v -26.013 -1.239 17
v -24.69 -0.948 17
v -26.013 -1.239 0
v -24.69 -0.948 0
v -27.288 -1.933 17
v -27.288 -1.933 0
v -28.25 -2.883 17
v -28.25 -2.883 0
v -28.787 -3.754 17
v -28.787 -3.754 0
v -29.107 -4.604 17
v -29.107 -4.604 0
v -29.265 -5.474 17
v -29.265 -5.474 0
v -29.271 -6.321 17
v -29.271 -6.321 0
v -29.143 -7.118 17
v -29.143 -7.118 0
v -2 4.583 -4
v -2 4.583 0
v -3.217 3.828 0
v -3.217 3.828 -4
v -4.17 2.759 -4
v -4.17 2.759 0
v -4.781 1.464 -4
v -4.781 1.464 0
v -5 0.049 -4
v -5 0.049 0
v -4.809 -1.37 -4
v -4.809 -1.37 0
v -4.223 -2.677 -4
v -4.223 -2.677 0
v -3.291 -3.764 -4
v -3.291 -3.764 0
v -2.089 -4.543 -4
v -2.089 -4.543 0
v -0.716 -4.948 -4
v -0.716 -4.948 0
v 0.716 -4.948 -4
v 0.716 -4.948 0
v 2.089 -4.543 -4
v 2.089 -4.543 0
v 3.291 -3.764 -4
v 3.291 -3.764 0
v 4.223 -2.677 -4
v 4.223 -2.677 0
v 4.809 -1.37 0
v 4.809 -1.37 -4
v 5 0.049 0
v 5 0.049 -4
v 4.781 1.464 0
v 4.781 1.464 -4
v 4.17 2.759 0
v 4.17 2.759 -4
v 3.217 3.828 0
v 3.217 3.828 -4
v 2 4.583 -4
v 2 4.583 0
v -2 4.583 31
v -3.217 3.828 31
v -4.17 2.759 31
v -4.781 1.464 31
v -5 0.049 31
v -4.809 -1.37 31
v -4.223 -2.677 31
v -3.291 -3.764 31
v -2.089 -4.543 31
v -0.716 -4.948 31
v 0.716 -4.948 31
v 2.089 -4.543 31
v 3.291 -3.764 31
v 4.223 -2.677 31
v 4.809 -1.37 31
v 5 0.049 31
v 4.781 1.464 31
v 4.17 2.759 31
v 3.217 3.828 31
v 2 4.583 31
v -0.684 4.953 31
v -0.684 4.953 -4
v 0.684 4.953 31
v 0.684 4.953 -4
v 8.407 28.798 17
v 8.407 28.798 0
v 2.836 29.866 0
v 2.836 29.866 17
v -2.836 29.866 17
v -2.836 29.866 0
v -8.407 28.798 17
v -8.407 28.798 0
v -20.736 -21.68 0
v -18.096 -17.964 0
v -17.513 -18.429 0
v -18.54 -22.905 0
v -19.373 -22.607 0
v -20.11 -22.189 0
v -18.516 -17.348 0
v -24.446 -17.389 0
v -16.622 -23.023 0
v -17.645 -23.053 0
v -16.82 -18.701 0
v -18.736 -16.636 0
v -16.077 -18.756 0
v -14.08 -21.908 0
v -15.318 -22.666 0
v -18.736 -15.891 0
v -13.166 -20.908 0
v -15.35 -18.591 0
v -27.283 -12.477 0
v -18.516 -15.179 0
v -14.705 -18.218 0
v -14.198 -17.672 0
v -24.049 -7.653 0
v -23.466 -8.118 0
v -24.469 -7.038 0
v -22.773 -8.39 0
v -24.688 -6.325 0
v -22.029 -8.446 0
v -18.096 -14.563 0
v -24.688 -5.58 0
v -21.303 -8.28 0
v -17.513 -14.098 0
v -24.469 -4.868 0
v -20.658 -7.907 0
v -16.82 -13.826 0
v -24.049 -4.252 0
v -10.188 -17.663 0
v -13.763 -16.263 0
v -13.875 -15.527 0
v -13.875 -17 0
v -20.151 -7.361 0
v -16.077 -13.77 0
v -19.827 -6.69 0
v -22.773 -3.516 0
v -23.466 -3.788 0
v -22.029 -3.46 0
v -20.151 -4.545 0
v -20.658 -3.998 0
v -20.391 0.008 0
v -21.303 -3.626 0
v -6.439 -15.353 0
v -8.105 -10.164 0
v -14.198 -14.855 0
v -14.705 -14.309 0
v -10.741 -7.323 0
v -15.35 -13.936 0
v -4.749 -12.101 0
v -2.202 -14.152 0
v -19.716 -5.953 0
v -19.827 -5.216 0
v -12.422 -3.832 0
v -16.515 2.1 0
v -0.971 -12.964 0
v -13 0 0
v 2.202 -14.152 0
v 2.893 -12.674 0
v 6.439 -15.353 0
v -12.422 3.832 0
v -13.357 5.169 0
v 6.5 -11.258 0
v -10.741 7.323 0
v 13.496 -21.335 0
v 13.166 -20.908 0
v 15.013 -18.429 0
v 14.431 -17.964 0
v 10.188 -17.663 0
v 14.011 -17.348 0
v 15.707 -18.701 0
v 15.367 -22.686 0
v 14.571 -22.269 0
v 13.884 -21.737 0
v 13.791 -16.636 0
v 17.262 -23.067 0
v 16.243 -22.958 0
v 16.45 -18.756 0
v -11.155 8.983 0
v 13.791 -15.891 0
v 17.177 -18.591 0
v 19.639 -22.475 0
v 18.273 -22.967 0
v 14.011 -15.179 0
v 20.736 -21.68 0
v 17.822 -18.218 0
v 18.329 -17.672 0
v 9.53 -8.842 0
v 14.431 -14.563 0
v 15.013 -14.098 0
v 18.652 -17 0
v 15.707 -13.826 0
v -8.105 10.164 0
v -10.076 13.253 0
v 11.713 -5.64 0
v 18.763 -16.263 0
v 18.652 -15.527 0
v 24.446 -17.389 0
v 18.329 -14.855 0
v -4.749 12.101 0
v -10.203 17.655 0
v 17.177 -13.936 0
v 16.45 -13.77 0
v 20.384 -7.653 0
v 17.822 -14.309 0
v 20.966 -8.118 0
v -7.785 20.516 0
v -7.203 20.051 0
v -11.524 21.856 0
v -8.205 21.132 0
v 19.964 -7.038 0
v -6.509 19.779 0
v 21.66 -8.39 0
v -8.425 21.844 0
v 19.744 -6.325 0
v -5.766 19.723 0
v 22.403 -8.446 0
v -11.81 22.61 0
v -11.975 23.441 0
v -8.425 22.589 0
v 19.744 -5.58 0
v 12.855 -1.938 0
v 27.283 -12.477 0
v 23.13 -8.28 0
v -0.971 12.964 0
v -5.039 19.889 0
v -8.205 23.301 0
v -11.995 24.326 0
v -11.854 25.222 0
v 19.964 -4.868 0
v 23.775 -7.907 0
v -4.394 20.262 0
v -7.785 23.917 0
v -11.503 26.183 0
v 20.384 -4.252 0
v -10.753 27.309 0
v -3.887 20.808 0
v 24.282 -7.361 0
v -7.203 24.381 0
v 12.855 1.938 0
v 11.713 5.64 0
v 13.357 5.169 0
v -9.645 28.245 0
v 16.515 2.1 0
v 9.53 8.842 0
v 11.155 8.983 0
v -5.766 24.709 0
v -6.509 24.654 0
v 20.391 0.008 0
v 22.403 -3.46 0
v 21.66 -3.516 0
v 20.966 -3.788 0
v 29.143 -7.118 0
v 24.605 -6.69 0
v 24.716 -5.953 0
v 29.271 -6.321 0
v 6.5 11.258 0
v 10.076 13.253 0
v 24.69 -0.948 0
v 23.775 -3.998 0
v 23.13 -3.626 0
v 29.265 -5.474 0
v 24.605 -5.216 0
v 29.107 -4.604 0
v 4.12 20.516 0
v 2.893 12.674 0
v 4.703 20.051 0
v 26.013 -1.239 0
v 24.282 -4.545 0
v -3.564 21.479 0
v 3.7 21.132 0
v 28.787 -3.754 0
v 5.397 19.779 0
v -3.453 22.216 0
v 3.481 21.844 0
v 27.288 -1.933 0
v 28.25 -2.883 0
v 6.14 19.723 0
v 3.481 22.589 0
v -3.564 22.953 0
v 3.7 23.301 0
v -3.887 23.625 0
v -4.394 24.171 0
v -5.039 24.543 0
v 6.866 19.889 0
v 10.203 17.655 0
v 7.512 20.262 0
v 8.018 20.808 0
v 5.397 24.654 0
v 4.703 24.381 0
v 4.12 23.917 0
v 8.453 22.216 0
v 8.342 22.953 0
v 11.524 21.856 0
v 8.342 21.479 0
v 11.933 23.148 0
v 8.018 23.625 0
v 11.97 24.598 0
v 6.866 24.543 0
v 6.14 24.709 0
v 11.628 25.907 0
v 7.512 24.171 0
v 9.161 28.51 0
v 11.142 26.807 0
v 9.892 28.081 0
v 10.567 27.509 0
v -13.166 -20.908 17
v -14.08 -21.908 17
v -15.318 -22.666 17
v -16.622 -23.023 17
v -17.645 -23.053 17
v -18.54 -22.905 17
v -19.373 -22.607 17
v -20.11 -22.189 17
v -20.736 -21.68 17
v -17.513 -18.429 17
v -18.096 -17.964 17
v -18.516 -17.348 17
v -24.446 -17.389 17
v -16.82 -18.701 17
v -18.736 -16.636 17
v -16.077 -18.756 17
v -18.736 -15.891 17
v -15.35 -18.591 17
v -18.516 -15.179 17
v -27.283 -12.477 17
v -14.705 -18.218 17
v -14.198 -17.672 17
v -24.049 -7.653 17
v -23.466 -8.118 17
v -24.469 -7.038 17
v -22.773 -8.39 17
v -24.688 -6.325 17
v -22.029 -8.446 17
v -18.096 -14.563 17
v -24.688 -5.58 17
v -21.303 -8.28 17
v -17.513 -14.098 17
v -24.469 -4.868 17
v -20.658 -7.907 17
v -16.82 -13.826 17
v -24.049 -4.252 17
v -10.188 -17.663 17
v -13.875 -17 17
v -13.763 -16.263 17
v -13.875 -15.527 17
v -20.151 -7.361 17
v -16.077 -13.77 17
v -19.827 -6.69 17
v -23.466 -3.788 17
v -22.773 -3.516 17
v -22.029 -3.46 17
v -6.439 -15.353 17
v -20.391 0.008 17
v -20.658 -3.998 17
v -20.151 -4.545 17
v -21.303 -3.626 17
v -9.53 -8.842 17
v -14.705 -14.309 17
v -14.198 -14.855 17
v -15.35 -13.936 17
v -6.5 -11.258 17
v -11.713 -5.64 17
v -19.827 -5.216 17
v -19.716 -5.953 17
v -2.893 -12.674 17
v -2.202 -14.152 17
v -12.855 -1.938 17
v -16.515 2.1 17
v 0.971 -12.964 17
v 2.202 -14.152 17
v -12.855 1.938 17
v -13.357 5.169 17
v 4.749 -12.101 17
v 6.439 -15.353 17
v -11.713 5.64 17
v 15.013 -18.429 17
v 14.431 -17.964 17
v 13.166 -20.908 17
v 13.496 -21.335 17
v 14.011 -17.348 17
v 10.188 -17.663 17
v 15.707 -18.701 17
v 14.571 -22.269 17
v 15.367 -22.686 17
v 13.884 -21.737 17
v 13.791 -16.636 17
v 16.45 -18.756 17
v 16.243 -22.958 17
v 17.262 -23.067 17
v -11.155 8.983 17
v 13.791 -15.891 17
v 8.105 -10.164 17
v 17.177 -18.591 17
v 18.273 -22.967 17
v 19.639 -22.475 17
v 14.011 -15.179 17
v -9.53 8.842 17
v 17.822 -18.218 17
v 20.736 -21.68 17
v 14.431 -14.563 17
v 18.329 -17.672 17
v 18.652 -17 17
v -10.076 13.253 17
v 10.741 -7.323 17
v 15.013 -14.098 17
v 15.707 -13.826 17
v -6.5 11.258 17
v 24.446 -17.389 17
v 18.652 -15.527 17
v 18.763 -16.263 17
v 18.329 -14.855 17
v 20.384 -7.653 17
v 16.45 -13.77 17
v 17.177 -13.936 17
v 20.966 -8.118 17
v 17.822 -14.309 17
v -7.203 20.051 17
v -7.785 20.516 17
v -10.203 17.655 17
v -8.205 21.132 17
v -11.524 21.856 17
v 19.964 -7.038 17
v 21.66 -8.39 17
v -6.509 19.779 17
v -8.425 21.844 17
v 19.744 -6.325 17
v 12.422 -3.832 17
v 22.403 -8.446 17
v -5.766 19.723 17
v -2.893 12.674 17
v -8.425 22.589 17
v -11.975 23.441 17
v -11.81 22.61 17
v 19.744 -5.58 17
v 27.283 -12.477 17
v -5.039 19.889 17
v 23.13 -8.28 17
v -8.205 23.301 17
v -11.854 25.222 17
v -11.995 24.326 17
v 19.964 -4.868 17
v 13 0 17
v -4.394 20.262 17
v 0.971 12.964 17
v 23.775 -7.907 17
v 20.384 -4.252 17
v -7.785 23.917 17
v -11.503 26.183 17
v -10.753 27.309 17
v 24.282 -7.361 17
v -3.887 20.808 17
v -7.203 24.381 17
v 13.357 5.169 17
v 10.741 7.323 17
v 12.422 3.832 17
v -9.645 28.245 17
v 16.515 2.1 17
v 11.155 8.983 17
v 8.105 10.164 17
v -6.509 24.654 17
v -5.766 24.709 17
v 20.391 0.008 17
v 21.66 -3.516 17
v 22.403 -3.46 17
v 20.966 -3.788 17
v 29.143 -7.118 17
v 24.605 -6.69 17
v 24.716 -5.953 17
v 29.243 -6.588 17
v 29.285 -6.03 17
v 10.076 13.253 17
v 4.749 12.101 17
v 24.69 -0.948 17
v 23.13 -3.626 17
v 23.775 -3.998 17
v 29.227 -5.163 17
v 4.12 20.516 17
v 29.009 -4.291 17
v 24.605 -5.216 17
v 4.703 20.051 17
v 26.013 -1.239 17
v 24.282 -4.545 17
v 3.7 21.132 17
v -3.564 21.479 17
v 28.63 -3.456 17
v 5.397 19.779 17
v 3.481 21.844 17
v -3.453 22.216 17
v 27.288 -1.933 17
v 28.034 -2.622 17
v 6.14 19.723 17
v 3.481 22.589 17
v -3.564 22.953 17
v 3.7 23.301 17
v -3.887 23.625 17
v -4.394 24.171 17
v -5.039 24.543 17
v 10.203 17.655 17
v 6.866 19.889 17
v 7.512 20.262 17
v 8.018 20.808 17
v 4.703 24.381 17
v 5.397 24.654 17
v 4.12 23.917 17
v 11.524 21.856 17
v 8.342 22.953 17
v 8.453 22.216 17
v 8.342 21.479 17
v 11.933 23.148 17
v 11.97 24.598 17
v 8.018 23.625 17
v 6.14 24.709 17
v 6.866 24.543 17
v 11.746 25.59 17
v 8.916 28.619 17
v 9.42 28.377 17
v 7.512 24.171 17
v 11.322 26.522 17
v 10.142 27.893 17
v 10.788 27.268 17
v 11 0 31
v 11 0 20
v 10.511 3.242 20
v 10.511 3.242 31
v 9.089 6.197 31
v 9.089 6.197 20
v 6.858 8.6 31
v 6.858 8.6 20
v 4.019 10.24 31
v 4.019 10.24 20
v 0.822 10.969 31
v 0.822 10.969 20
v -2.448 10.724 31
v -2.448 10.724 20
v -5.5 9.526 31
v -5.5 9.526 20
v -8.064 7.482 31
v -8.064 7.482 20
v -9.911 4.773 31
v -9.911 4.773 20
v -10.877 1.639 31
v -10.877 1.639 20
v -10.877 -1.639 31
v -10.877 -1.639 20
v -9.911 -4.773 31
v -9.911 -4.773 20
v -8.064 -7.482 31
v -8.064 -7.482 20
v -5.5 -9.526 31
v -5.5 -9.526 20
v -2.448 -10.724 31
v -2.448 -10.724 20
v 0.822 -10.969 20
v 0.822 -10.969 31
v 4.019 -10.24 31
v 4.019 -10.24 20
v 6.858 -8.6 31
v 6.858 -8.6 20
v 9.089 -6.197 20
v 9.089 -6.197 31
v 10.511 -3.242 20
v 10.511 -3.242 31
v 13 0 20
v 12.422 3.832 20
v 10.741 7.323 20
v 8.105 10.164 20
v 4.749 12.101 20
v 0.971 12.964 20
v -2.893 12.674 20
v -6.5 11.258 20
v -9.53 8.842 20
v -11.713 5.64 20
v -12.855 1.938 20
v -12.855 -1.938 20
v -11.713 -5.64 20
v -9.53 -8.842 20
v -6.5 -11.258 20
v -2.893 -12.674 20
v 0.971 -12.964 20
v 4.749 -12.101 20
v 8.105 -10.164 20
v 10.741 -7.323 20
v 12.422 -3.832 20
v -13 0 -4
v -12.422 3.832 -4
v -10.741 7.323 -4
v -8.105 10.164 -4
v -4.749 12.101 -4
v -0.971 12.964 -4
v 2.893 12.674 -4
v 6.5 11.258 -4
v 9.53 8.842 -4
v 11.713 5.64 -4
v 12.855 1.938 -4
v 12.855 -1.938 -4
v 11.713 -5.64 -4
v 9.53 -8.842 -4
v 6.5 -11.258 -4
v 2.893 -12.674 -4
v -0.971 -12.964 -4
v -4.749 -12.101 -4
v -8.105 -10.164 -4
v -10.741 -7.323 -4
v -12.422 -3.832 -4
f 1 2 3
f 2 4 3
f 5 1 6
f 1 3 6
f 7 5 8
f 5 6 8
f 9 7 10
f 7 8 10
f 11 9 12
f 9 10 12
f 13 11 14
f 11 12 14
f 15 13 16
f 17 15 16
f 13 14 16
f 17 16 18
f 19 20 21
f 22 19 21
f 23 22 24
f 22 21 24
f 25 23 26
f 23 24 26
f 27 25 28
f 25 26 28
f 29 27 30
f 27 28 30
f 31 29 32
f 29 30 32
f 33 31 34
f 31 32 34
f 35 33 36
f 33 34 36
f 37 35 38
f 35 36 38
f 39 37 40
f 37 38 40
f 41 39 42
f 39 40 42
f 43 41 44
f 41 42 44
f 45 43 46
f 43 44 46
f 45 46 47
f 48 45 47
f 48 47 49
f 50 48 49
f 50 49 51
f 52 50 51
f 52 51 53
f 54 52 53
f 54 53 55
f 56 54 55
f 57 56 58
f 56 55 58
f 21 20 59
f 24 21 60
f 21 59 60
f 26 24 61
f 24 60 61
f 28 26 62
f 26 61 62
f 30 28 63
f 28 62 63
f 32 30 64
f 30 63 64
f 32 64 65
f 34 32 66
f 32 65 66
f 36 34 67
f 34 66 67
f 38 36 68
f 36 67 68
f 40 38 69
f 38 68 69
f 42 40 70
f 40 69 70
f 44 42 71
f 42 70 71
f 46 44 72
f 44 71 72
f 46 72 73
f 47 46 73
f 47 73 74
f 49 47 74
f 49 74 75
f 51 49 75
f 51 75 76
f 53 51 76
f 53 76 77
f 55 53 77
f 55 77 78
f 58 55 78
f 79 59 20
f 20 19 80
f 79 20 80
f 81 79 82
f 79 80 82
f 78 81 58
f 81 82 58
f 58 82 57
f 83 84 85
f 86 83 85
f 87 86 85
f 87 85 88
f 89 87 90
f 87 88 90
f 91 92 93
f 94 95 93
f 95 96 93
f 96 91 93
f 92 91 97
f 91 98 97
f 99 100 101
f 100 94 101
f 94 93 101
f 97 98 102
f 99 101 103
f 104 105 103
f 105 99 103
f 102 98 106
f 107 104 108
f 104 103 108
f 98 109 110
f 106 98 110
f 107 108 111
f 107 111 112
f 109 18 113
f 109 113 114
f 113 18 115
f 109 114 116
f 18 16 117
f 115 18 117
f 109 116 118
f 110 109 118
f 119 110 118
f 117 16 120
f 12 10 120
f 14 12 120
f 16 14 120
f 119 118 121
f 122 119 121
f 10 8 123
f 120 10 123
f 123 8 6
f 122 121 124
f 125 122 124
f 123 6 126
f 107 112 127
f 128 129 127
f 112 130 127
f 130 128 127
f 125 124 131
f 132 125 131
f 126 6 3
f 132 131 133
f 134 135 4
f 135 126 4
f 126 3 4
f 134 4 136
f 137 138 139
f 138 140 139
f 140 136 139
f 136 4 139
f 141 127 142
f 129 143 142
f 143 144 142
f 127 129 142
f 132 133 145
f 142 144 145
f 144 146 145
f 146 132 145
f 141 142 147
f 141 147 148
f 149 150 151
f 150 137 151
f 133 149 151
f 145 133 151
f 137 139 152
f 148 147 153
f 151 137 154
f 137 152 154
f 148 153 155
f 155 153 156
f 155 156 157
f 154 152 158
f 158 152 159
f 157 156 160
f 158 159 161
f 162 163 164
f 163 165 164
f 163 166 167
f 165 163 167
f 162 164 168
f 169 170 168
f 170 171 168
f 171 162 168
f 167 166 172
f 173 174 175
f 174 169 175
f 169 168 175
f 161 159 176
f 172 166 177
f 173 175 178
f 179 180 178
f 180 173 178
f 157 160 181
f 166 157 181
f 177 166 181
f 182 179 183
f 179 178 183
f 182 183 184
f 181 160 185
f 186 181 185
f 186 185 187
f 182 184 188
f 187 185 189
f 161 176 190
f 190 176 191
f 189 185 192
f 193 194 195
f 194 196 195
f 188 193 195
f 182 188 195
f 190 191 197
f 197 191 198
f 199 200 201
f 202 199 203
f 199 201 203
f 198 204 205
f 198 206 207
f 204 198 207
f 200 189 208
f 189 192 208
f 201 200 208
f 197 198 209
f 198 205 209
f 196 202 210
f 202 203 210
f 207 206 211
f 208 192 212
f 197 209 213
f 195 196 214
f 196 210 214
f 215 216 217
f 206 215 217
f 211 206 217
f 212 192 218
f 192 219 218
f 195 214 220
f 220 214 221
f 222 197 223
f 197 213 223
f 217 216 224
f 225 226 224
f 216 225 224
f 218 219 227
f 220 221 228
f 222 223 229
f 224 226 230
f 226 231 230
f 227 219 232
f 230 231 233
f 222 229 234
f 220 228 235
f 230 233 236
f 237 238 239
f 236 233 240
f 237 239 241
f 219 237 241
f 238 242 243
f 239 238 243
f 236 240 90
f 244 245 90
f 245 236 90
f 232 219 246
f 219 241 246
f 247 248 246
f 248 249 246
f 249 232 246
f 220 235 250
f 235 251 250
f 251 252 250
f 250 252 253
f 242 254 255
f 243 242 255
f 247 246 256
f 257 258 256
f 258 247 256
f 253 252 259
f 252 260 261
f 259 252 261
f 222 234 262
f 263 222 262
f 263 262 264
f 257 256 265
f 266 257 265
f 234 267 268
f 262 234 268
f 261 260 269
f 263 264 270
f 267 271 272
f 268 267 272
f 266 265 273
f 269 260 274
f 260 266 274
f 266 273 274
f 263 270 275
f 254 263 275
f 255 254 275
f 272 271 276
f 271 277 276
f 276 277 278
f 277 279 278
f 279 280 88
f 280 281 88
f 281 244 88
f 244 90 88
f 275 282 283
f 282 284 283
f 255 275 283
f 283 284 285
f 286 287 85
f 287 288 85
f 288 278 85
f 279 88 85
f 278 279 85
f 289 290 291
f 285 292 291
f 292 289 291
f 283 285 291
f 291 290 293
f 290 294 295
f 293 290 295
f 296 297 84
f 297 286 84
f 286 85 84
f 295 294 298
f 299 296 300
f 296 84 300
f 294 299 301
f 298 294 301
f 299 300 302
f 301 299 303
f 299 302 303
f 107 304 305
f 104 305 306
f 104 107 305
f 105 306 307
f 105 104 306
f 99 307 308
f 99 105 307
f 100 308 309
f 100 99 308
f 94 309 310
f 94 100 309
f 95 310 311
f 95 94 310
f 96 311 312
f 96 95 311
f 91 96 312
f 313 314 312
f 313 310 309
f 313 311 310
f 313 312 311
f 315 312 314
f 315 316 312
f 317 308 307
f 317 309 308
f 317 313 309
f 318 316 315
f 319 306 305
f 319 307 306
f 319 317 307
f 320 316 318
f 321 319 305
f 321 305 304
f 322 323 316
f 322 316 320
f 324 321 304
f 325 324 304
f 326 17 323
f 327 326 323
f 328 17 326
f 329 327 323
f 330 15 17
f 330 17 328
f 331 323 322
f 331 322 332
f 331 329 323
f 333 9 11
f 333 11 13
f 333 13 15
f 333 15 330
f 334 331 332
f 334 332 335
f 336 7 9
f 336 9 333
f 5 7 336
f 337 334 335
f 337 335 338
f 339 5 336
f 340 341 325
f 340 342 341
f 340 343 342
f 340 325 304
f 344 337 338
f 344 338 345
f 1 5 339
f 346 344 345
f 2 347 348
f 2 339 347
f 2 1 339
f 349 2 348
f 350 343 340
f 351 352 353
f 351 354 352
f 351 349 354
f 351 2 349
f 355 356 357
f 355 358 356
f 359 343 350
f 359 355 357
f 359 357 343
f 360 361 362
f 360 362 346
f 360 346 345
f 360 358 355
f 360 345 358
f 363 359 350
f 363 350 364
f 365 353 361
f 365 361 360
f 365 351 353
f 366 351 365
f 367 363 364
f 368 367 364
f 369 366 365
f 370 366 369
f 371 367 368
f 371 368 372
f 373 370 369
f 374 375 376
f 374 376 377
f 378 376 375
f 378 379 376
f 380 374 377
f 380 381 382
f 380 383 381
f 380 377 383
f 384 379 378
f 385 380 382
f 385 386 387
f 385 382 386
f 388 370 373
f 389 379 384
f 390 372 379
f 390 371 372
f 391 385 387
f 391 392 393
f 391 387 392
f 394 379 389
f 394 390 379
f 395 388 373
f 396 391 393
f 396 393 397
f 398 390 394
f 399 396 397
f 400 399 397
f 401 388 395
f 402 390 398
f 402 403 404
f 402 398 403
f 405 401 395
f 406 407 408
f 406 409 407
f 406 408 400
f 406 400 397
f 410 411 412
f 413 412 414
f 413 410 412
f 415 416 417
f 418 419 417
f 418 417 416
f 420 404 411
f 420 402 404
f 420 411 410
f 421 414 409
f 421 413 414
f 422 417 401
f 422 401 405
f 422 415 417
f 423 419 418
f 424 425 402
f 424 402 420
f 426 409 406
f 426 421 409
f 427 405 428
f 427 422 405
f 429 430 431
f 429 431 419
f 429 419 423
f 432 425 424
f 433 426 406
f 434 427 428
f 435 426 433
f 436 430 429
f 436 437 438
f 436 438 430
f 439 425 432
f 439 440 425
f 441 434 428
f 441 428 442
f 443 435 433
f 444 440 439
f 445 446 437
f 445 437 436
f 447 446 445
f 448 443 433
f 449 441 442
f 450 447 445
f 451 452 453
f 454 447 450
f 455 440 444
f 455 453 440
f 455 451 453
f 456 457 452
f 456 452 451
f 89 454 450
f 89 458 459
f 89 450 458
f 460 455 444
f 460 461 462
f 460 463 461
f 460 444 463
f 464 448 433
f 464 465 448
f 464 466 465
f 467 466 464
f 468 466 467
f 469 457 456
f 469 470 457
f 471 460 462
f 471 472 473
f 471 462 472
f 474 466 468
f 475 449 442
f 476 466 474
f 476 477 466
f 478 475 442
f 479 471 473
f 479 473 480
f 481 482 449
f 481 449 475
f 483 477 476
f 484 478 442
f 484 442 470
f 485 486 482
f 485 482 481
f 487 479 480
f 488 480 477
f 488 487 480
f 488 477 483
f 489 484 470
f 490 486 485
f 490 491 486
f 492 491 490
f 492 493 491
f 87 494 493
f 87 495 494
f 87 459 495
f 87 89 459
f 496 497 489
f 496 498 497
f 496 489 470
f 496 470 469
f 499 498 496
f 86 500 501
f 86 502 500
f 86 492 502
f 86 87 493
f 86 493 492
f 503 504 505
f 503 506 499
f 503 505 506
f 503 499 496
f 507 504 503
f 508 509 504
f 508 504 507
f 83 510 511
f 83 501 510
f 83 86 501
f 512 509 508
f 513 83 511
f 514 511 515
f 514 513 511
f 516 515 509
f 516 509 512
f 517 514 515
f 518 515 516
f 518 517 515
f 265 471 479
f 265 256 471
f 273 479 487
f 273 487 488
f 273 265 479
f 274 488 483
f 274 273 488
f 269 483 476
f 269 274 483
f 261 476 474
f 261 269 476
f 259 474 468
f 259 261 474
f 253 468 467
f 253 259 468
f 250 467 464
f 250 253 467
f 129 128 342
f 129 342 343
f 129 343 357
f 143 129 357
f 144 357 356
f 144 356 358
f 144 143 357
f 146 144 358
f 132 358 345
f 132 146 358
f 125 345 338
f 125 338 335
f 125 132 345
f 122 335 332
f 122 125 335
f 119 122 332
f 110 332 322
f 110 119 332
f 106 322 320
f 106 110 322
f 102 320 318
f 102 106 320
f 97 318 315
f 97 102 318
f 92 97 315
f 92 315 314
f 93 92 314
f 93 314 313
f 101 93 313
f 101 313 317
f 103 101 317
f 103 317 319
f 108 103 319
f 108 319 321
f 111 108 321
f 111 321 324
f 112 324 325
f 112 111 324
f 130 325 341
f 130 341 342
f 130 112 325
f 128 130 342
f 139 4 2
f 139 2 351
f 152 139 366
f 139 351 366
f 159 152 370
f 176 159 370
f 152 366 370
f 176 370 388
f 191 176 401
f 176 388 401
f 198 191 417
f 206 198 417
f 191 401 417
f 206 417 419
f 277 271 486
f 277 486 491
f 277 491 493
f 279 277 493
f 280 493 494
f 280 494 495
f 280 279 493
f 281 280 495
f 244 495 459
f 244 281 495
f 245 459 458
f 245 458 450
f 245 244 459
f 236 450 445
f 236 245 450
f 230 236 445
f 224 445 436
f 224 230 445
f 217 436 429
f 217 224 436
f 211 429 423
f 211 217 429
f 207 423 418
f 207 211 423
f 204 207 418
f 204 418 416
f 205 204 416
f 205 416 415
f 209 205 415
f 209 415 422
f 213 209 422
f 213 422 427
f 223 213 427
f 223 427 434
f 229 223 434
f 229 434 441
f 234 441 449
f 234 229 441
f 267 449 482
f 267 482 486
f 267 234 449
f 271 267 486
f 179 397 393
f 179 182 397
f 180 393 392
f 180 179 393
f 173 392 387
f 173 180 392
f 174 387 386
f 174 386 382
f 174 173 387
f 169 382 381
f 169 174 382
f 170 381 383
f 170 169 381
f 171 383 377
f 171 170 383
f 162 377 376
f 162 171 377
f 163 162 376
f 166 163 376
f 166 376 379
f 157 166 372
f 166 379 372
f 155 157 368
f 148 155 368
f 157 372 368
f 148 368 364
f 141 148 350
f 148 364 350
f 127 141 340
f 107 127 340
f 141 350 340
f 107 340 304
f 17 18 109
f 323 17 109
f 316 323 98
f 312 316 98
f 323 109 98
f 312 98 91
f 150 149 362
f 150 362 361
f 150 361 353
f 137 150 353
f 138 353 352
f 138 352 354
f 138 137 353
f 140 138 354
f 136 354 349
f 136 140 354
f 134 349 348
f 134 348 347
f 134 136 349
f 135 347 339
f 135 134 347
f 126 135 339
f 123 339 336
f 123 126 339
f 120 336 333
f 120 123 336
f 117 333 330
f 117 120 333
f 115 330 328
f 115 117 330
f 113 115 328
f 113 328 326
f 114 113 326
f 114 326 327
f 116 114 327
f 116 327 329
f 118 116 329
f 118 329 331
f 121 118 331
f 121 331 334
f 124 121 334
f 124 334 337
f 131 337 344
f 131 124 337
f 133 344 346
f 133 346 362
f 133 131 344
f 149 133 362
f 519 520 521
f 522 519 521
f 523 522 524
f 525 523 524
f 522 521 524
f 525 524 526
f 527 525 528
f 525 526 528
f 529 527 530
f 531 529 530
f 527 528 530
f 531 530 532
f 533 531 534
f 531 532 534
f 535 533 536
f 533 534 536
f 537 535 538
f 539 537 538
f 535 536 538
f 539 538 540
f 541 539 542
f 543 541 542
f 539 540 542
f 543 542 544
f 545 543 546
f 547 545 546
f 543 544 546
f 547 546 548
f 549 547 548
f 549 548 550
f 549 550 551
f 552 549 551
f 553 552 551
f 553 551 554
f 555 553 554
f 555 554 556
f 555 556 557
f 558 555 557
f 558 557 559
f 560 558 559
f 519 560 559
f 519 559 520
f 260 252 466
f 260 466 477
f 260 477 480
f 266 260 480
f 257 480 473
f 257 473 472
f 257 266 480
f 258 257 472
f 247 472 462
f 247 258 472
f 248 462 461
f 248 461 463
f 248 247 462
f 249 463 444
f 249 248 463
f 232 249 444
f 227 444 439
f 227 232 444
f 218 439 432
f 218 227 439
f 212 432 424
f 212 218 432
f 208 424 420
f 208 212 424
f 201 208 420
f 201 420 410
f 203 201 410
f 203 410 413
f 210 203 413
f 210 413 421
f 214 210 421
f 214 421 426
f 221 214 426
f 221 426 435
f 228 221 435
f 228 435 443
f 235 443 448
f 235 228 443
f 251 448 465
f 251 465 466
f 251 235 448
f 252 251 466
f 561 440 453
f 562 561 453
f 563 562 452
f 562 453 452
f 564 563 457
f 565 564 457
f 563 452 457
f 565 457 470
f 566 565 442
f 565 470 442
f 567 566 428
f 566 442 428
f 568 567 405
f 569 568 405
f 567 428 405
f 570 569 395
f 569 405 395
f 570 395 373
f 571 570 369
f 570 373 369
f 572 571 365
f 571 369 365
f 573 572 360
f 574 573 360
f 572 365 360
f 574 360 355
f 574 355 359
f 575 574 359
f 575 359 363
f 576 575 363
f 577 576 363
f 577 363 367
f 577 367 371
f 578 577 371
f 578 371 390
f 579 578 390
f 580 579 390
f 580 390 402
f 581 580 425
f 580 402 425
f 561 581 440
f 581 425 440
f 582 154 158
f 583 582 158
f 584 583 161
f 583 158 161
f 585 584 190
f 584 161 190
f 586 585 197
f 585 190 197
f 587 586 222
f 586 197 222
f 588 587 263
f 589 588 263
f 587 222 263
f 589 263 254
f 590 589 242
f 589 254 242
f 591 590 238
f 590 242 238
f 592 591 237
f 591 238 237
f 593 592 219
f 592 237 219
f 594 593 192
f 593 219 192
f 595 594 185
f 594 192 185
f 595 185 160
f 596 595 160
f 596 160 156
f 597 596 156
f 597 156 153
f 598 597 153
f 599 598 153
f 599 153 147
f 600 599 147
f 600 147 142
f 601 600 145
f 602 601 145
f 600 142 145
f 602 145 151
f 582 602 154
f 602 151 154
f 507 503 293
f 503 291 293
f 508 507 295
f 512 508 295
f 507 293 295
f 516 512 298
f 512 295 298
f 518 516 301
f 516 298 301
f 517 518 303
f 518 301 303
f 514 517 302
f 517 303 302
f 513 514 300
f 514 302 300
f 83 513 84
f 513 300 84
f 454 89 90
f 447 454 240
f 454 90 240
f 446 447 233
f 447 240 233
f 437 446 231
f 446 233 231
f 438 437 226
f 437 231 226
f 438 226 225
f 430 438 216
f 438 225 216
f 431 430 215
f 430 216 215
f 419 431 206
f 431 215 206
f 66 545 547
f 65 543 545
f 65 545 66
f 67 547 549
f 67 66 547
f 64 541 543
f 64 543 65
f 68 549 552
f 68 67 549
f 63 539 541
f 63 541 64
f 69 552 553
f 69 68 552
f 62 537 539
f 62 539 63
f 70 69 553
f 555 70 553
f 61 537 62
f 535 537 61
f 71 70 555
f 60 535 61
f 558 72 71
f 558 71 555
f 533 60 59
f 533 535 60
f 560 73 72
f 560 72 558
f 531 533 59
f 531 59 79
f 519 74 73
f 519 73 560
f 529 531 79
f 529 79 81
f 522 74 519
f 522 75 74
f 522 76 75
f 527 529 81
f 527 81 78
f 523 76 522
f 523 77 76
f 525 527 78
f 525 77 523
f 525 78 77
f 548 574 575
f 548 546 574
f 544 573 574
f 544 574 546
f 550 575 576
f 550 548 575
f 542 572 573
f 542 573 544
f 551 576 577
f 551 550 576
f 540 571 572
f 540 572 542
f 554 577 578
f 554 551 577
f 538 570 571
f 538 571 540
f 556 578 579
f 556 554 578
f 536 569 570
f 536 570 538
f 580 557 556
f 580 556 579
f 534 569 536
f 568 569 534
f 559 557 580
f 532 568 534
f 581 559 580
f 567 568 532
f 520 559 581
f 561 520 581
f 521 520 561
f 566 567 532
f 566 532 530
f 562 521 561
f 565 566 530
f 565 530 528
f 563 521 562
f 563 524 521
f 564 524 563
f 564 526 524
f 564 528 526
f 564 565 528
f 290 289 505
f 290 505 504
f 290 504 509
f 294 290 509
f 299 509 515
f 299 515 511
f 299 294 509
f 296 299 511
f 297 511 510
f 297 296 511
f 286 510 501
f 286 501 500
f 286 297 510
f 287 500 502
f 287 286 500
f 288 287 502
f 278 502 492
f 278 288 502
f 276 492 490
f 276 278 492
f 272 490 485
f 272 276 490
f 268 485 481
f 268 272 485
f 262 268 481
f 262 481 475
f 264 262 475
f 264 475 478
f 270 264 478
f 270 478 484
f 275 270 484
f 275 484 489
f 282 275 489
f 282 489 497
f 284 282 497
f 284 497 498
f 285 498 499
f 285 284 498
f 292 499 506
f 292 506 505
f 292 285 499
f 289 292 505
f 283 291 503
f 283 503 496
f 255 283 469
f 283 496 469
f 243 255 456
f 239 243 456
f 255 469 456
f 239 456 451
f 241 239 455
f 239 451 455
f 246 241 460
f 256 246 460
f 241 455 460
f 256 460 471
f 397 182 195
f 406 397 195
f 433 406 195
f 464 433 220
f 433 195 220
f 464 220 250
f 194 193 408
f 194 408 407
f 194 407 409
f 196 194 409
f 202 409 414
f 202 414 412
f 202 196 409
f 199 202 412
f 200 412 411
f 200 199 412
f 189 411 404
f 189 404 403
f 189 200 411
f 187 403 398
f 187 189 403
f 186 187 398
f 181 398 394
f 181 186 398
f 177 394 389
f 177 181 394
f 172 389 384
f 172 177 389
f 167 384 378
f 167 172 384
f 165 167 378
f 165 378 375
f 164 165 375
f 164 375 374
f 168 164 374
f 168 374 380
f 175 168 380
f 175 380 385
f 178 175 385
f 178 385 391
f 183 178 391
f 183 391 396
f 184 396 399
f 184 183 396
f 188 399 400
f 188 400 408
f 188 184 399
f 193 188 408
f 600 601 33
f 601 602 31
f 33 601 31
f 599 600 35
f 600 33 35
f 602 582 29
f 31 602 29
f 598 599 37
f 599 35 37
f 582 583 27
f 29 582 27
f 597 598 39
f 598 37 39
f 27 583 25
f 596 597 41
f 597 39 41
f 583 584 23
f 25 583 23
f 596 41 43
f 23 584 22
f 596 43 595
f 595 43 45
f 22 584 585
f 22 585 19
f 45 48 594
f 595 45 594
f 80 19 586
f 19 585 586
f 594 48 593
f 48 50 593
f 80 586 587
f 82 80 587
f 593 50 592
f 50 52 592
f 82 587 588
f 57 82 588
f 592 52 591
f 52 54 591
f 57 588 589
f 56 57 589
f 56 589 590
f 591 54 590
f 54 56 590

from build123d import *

# Parameters (mm, degrees)
SKETCH_1_R               = 30
SKETCH_1_R_2             = 2.5
EXTRUDE_1_DEPTH          = 17
SKETCH_2_R               = 16
CUT_EXTRUDE_1_DEPTH      = 18
PATTERN_CIRCULAR_1_COUNT = 3
SKETCH_4_R               = 11
EXTRUDE_3_DEPTH          = 14
SKETCH_5_R               = 5
CUT_EXTRUDE_2_DEPTH      = 32
SKETCH_6_W               = 4
SKETCH_6_H               = 2.5
CUT_EXTRUDE_3_DEPTH      = 32
SKETCH_7_R               = 13
EXTRUDE_4_DEPTH          = 4
EXTRUDE_5_DEPTH          = 35
SKETCH_10_R              = 13
SKETCH_10_R_2            = 11
EXTRUDE_8_DEPTH          = 3
FILLET_1_R               = 5


with BuildPart() as part:
    # 草图1 → 凸台-拉伸1 (new body)
    with BuildSketch(Plane.XY):
        Circle(SKETCH_1_R)
        with Locations((-5.952838037, 22.216294005)):
            Circle(SKETCH_1_R_2, mode=Mode.SUBTRACT)
        with Locations((5.952838037, 22.216294005)):
            Circle(SKETCH_1_R_2, mode=Mode.SUBTRACT)
        with Locations((22.216294005, -5.952838037)):
            Circle(SKETCH_1_R_2, mode=Mode.SUBTRACT)
        with Locations((16.263455967, -16.263455967)):
            Circle(SKETCH_1_R_2, mode=Mode.SUBTRACT)
        with Locations((-16.263455967, -16.263455967)):
            Circle(SKETCH_1_R_2, mode=Mode.SUBTRACT)
        with Locations((-22.216294005, -5.952838037)):
            Circle(SKETCH_1_R_2, mode=Mode.SUBTRACT)
    extrude(amount=EXTRUDE_1_DEPTH)

    # 草图2 → 切除-拉伸1 (cut, through all)
    with BuildSketch(Plane.XY.offset(17)):
        with Locations((25.980762114, 15)):
            Circle(SKETCH_2_R)
    cut_extrude_1 = extrude(amount=-CUT_EXTRUDE_1_DEPTH, mode=Mode.SUBTRACT)

    # 阵列(圆周)1: 切除-拉伸1 ×3 about axis
    pattern_circular_1_axis = Axis((0, 0, 0), (0, 0, 1))
    for i in range(1, PATTERN_CIRCULAR_1_COUNT):
        add(cut_extrude_1.rotate(pattern_circular_1_axis, i * 360 / PATTERN_CIRCULAR_1_COUNT), mode=Mode.SUBTRACT)

    # 草图4 → 凸台-拉伸3 (add)
    with BuildSketch(Plane.XY.offset(17)):
        Circle(SKETCH_4_R)
    extrude(amount=EXTRUDE_3_DEPTH)

    # 草图5 → 切除-拉伸2 (cut, through all)
    with BuildSketch(Plane.XY.offset(31)):
        Circle(SKETCH_5_R)
    extrude(amount=-CUT_EXTRUDE_2_DEPTH, mode=Mode.SUBTRACT)

    # 草图6 → 切除-拉伸3 (cut, through all)
    with BuildSketch(Plane.XY.offset(31)):
        with Locations((0, 5)):
            Rectangle(SKETCH_6_W, SKETCH_6_H)
    extrude(amount=-CUT_EXTRUDE_3_DEPTH, mode=Mode.SUBTRACT)

    # 草图7 → 凸台-拉伸4 (add)
    with BuildSketch(Plane(origin=(0, 0, 0), x_dir=(-1, 0, 0), z_dir=(0, 0, -1))):
        Circle(SKETCH_7_R)
        with BuildLine():
            Line((-2, 4.582575695), (-2, 6.25))
            Line((-2, 6.25), (2, 6.25))
            Line((2, 6.25), (2, 4.582575695))
            ThreePointArc((2, 4.582575695), (0, -5), (-2, 4.582575695))
        make_face(mode=Mode.SUBTRACT)
    extrude(amount=EXTRUDE_4_DEPTH)

    # 草图8 → 凸台-拉伸5 (add)
    with BuildSketch(Plane(origin=(0, 0, -4), x_dir=(-1, 0, 0), z_dir=(0, 0, -1))):
        with BuildLine():
            Line((-2, 4.582575695), (-2, 6.25))
            Line((-2, 6.25), (2, 6.25))
            Line((2, 6.25), (2, 4.582575695))
            ThreePointArc((2, 4.582575695), (0, 5), (-2, 4.582575695))
        make_face()
    extrude(amount=-EXTRUDE_5_DEPTH)

    # 草图10 → 凸台-拉伸8 (add)
    with BuildSketch(Plane.XY.offset(17)):
        Circle(SKETCH_10_R)
        Circle(SKETCH_10_R_2, mode=Mode.SUBTRACT)
    extrude(amount=EXTRUDE_8_DEPTH)

    # 圆角1
    fillet_1_edges = [part.edges().sort_by_distance(p)[0] for p in [
        (14.575409833, 26.221316294, 8.5),
        (29.996030948, -0.487982961, 8.5),
        (-29.996030948, -0.487982961, 8.5),
        (-14.575409833, 26.221316294, 8.5),
        (15.420621114, -25.733333333, 8.5),
        (-15.420621114, -25.733333333, 8.5),
    ]]
    fillet(fillet_1_edges, radius=FILLET_1_R)


solid = part.part
